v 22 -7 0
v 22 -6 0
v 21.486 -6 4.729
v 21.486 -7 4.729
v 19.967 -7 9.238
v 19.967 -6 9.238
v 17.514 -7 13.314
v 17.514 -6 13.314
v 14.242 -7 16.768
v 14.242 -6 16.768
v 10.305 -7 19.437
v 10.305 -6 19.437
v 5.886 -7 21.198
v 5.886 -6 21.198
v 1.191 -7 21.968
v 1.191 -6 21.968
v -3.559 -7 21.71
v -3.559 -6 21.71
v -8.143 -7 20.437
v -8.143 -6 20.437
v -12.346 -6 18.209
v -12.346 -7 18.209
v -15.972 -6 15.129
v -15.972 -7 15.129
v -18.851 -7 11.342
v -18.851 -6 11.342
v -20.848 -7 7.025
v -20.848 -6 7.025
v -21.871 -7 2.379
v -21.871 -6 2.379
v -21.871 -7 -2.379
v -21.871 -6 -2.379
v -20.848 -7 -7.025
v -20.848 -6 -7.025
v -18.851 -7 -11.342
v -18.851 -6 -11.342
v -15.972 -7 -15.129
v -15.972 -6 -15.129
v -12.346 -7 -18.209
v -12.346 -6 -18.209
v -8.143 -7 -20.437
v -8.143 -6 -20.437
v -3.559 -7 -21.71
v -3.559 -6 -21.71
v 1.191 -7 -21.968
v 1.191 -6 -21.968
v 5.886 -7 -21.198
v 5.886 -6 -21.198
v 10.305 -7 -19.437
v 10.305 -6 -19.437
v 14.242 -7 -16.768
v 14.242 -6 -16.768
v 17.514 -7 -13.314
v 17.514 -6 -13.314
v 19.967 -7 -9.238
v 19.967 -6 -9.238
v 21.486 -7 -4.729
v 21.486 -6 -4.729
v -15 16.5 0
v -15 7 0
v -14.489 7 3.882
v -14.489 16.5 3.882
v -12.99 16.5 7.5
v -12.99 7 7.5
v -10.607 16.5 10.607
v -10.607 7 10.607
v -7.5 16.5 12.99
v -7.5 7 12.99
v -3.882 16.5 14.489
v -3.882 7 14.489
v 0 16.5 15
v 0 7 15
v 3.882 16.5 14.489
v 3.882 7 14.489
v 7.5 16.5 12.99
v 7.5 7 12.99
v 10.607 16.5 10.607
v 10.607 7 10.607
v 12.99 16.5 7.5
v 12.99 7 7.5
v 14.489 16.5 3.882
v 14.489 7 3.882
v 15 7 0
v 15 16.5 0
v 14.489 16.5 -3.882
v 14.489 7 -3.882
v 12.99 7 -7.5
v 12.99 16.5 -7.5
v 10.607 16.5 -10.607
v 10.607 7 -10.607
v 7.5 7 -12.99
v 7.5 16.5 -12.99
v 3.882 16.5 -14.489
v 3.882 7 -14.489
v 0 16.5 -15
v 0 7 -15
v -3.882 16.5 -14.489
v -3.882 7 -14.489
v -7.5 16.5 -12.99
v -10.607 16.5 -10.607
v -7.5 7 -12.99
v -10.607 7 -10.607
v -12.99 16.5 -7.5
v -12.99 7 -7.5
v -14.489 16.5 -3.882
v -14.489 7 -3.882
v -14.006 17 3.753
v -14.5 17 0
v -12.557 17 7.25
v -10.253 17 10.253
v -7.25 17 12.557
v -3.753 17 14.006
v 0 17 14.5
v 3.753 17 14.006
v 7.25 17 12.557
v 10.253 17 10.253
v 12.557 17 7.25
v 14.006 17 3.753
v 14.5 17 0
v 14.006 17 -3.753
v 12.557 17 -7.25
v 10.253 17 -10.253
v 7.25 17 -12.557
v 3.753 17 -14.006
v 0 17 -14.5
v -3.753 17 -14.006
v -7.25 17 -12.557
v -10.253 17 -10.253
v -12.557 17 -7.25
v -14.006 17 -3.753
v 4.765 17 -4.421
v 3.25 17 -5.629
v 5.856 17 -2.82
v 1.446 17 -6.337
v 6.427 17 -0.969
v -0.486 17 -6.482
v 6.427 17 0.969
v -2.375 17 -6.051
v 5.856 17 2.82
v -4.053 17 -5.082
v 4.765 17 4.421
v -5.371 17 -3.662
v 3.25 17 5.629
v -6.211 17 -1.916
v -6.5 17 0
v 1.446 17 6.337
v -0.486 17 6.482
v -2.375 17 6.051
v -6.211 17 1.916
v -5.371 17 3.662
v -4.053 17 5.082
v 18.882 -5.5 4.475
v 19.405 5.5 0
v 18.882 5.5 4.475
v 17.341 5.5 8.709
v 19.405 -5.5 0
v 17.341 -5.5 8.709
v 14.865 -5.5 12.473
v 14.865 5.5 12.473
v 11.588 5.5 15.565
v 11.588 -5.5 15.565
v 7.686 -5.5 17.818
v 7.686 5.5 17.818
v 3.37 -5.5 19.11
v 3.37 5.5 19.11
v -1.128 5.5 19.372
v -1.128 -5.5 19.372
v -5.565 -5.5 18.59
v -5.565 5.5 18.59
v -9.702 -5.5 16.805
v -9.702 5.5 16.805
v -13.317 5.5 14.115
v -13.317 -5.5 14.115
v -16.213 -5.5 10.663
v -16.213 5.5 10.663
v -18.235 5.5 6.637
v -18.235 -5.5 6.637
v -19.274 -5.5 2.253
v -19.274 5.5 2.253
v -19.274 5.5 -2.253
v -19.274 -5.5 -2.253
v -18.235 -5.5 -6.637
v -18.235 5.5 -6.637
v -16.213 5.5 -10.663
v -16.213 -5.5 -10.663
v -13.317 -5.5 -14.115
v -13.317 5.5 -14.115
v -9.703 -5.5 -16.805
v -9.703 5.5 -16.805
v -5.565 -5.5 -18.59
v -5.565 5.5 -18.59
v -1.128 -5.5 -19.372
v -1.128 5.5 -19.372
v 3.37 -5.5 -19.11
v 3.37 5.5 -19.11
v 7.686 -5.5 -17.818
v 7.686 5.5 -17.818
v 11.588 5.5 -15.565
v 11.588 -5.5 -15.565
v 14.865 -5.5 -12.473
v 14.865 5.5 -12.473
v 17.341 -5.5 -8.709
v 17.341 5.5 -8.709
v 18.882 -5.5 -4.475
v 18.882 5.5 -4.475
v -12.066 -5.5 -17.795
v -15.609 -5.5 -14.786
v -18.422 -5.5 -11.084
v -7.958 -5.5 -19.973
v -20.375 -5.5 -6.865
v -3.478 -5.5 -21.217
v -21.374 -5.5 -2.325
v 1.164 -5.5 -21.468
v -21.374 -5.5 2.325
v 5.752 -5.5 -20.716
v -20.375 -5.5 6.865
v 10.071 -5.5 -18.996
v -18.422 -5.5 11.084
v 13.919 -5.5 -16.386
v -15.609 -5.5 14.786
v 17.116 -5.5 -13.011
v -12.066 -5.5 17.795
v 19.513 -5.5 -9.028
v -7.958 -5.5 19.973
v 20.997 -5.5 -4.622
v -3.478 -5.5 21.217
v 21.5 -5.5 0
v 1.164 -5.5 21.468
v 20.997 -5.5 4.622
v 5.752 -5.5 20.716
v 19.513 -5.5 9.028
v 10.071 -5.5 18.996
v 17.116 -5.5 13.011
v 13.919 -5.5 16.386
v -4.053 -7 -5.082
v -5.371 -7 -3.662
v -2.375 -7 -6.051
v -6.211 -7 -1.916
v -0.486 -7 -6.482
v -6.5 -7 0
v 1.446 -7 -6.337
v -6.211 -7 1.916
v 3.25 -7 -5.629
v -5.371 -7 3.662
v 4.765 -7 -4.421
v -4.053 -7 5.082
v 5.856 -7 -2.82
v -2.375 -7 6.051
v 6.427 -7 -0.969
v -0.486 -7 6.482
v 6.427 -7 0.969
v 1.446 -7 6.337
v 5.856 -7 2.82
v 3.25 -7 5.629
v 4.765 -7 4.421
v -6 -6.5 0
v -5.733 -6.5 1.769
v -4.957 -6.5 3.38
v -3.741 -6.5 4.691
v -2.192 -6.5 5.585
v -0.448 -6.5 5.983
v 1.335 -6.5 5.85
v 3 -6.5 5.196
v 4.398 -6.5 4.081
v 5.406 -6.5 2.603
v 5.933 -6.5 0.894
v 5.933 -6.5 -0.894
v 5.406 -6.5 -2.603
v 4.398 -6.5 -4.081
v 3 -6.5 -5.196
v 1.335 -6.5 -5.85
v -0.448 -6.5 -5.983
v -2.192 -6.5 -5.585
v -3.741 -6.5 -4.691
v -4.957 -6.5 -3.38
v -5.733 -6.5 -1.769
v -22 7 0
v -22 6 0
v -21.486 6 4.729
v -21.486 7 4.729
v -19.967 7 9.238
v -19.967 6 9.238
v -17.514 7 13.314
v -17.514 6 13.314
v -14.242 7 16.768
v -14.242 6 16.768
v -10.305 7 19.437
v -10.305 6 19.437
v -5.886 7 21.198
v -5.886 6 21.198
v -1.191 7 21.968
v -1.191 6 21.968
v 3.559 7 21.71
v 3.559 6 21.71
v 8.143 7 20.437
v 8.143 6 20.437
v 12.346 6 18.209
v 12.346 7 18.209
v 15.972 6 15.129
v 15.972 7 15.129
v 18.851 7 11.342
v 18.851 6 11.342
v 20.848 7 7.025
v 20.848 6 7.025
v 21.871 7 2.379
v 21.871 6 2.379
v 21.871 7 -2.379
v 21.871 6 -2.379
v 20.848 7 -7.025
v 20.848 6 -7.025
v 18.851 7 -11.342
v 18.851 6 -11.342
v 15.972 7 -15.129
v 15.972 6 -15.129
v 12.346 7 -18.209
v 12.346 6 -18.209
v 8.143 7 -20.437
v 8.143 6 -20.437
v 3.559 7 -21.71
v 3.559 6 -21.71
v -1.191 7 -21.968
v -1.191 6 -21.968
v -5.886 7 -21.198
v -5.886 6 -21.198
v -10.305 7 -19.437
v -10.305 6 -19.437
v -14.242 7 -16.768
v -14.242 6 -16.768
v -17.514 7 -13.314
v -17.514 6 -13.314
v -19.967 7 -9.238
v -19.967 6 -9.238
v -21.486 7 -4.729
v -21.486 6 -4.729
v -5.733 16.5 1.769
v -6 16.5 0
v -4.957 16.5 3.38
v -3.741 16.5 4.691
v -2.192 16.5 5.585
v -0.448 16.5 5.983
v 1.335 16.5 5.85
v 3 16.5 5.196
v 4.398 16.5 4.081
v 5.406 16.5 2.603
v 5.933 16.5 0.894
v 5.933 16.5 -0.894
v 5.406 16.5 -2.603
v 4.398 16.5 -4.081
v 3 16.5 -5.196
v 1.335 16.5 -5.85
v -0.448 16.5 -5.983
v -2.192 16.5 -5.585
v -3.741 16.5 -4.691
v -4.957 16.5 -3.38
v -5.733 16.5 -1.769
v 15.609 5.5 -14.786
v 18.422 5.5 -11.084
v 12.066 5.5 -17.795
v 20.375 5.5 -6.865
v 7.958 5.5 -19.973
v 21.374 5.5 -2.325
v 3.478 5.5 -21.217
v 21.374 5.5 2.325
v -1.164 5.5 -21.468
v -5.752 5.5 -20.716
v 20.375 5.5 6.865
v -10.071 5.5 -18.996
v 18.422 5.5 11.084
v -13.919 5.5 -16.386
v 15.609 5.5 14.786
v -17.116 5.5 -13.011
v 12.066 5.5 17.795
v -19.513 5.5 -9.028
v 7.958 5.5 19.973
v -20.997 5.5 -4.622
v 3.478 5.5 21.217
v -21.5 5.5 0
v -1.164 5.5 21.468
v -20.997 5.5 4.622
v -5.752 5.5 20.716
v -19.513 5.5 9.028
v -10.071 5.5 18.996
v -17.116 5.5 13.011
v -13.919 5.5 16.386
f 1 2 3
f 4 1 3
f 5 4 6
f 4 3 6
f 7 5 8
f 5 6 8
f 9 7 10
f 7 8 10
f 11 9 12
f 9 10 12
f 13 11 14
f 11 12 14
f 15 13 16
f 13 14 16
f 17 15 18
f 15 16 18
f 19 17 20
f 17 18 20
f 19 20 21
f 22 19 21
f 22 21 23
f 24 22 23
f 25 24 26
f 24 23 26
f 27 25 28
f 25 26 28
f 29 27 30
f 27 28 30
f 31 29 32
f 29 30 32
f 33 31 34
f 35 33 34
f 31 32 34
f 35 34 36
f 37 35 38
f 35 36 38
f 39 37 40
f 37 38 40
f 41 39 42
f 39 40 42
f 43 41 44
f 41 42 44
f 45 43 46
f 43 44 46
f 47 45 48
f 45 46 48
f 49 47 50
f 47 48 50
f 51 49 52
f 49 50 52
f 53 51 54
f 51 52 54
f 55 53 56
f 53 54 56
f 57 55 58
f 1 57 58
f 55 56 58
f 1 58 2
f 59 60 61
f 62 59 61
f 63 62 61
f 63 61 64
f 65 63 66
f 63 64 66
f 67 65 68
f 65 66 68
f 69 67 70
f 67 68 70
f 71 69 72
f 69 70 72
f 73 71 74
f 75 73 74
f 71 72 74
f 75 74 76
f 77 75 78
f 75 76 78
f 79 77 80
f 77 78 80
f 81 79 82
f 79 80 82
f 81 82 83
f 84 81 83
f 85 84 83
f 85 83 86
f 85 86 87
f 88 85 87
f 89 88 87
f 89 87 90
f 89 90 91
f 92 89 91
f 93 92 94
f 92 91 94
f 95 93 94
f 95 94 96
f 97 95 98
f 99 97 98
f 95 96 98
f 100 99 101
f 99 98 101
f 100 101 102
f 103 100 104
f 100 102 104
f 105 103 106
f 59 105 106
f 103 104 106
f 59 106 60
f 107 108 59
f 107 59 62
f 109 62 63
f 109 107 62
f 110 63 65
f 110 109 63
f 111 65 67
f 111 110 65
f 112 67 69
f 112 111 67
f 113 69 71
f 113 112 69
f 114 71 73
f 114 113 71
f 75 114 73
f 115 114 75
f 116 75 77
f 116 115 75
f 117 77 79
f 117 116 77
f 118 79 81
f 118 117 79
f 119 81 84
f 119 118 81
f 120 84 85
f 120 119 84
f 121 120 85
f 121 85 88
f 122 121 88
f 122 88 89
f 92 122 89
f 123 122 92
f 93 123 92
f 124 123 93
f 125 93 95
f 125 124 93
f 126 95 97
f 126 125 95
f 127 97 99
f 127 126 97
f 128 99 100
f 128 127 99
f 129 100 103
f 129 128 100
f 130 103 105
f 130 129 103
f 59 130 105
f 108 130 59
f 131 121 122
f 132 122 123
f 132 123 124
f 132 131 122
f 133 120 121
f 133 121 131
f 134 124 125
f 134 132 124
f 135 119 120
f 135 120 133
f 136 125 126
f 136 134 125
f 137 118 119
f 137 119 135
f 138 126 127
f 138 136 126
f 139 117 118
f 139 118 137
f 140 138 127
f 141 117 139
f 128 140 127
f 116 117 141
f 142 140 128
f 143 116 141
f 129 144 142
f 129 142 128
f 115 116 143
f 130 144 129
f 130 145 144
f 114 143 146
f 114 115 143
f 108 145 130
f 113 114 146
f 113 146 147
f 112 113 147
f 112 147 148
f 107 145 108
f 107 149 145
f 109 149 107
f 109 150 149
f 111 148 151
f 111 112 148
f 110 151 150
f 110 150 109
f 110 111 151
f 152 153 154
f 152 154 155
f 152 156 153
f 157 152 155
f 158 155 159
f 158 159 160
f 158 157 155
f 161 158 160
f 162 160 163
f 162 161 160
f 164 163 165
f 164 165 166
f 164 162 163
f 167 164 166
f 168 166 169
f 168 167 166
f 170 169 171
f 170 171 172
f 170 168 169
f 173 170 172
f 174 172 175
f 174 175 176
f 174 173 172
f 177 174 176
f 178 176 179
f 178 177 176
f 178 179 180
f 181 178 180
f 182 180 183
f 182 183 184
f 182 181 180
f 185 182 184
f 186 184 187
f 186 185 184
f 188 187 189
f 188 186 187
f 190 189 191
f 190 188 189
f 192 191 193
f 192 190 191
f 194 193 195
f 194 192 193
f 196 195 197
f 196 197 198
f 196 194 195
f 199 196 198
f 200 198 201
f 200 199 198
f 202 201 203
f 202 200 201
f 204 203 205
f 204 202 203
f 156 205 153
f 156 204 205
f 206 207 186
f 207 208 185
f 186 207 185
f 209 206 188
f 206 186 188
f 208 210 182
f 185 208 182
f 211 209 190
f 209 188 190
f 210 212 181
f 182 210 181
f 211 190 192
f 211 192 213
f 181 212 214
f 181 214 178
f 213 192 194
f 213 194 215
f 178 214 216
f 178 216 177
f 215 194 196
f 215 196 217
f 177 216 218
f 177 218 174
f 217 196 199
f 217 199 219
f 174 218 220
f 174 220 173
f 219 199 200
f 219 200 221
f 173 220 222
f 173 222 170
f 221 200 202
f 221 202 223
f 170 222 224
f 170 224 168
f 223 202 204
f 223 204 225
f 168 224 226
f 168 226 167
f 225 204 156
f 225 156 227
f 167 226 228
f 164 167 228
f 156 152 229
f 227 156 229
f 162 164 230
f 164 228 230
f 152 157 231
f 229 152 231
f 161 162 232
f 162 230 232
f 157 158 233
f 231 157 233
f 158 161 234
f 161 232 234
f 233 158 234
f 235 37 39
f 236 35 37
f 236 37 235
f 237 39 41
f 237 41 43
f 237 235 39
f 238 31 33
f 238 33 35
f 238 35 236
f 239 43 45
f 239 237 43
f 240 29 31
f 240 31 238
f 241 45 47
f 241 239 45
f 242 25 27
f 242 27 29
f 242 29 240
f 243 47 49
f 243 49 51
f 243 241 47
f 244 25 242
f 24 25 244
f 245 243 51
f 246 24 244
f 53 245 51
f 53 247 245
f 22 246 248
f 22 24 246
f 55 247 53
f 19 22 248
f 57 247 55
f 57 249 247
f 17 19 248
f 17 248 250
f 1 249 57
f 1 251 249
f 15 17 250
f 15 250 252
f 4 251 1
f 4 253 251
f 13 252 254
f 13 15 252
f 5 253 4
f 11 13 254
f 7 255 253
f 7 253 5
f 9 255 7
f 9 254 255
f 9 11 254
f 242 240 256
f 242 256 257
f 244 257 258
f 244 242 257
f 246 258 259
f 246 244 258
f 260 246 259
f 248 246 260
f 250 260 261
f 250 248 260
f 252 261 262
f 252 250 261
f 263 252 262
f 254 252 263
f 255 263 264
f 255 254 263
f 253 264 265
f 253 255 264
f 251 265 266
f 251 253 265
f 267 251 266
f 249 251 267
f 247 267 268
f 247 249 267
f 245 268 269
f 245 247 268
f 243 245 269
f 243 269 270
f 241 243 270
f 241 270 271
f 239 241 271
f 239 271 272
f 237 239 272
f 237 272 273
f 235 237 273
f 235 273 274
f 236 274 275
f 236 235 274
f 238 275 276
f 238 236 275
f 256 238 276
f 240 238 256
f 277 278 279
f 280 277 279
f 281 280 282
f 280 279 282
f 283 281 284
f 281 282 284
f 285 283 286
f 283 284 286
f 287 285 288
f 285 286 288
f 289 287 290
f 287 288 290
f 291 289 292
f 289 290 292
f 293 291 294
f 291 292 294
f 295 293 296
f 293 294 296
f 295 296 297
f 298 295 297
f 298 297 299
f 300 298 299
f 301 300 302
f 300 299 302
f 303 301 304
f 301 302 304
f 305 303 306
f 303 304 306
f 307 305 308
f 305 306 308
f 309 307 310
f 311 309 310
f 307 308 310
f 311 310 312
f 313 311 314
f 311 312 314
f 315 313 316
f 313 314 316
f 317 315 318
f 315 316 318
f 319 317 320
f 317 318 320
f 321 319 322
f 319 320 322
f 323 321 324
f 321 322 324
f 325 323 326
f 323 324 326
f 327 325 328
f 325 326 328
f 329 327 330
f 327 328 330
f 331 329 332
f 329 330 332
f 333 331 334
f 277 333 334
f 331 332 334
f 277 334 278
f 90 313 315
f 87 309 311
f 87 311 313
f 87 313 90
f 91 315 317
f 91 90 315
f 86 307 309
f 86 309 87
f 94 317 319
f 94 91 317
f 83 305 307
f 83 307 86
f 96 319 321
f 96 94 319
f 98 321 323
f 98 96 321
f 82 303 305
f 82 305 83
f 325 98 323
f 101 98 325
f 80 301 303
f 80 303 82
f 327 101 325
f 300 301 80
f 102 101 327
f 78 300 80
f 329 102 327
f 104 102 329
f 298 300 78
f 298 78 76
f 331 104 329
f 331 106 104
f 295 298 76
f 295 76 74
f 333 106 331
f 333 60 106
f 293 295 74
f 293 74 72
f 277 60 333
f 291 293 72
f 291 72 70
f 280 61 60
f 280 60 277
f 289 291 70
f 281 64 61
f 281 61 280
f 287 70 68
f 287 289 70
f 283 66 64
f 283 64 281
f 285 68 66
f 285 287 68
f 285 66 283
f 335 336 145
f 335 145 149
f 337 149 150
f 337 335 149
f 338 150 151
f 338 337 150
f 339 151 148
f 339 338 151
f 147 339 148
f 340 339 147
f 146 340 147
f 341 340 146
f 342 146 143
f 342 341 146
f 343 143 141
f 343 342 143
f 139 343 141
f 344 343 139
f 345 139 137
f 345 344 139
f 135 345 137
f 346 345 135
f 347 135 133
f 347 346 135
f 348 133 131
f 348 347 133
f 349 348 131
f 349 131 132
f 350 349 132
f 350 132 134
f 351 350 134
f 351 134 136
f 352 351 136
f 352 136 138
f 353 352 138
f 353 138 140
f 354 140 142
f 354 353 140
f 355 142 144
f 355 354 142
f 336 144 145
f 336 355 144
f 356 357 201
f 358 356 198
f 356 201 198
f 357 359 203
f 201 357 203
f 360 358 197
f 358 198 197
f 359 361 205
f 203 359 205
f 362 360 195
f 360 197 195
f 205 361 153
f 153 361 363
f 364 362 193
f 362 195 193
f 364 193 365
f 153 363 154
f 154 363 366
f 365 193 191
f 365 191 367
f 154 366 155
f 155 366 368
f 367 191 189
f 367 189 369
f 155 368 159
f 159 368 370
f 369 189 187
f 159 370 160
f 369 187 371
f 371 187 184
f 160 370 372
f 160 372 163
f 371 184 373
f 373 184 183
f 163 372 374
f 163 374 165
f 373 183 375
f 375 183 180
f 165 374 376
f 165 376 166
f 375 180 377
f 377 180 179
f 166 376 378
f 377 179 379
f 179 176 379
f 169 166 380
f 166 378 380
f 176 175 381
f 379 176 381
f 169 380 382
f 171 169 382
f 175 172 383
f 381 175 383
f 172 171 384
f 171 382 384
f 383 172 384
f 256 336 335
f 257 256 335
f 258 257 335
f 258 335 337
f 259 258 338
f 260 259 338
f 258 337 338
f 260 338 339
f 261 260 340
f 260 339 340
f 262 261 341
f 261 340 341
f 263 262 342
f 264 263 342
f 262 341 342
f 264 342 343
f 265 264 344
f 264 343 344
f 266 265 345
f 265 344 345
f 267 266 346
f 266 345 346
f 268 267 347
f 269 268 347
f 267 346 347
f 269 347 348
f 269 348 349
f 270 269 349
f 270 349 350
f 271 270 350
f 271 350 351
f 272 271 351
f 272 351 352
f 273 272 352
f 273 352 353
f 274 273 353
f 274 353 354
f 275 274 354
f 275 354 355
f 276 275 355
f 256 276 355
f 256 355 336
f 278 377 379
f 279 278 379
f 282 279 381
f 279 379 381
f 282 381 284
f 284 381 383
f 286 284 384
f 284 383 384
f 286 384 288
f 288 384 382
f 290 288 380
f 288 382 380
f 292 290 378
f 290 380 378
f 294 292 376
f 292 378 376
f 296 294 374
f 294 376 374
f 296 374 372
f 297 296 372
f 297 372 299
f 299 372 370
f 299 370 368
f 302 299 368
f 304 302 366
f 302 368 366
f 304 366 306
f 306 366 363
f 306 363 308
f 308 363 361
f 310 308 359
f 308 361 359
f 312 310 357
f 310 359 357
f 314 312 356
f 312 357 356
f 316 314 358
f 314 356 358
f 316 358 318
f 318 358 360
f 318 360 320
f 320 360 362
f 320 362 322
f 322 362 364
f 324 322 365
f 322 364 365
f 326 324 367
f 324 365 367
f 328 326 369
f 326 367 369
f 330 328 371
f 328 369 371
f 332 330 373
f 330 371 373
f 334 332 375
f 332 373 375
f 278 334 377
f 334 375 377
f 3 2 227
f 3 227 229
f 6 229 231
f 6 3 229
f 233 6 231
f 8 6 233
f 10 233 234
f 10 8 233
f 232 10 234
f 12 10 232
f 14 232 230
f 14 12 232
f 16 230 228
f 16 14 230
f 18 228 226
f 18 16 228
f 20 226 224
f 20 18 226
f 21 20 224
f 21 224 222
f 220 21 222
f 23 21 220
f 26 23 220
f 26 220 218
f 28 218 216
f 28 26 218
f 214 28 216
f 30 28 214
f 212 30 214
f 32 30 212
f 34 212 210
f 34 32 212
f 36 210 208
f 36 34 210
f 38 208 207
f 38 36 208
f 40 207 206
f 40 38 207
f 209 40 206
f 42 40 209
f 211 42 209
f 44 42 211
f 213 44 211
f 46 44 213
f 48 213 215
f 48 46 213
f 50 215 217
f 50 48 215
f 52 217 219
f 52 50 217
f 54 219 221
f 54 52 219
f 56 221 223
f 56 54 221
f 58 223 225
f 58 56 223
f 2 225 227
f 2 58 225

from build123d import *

# Parameters (mm, degrees)
F0_R     = 19.405
F1_DEPTH = 5.5
F2_R     = 22
F3_DEPTH = 1.5
F4_R     = 22
F5_DEPTH = 1.5
F6_R     = 15
F7_DEPTH = 10
F8_R     = 6
F9_DEPTH = 24.001
F10_SIZE = 0.5


with BuildPart() as f1:
    # F0 (on Front) → F1 (new body, symmetric)
    with BuildSketch(Plane.XZ):
        Circle(F0_R)
    extrude(amount=F1_DEPTH, both=True)

    # F2 (on face) → F3 (join)
    with BuildSketch(Plane.XZ.offset(5.5)):
        Circle(F2_R)
    extrude(amount=F3_DEPTH)

    # F4 (on face) → F5 (join)
    with BuildSketch(Plane(origin=(0, 5.5, 0), x_dir=(-1, 0, 0), z_dir=(0, 1, 0))):
        Circle(F4_R)
    extrude(amount=F5_DEPTH)

    # F6 (on face) → F7 (join)
    with BuildSketch(Plane(origin=(0, 7, 0), x_dir=(-1, 0, 0), z_dir=(0, 1, 0))):
        Circle(F6_R)
    extrude(amount=F7_DEPTH)

    # F8 (on face) → F9 (cut, through all)
    with BuildSketch(Plane(origin=(0, 17, 0), x_dir=(-1, 0, 0), z_dir=(0, 1, 0))):
        Circle(F8_R)
    extrude(amount=-F9_DEPTH, mode=Mode.SUBTRACT)

    # F10
    f10_edges = [f1.edges().sort_by_distance(p)[0] for p in [
        (6, -7, 0),
        (6, 17, 0),
        (-22, -5.5, 0),
        (22, 5.5, 0),
        (15, 17, 0),
    ]]
    chamfer(f10_edges, length=F10_SIZE)


solid = f1.part
